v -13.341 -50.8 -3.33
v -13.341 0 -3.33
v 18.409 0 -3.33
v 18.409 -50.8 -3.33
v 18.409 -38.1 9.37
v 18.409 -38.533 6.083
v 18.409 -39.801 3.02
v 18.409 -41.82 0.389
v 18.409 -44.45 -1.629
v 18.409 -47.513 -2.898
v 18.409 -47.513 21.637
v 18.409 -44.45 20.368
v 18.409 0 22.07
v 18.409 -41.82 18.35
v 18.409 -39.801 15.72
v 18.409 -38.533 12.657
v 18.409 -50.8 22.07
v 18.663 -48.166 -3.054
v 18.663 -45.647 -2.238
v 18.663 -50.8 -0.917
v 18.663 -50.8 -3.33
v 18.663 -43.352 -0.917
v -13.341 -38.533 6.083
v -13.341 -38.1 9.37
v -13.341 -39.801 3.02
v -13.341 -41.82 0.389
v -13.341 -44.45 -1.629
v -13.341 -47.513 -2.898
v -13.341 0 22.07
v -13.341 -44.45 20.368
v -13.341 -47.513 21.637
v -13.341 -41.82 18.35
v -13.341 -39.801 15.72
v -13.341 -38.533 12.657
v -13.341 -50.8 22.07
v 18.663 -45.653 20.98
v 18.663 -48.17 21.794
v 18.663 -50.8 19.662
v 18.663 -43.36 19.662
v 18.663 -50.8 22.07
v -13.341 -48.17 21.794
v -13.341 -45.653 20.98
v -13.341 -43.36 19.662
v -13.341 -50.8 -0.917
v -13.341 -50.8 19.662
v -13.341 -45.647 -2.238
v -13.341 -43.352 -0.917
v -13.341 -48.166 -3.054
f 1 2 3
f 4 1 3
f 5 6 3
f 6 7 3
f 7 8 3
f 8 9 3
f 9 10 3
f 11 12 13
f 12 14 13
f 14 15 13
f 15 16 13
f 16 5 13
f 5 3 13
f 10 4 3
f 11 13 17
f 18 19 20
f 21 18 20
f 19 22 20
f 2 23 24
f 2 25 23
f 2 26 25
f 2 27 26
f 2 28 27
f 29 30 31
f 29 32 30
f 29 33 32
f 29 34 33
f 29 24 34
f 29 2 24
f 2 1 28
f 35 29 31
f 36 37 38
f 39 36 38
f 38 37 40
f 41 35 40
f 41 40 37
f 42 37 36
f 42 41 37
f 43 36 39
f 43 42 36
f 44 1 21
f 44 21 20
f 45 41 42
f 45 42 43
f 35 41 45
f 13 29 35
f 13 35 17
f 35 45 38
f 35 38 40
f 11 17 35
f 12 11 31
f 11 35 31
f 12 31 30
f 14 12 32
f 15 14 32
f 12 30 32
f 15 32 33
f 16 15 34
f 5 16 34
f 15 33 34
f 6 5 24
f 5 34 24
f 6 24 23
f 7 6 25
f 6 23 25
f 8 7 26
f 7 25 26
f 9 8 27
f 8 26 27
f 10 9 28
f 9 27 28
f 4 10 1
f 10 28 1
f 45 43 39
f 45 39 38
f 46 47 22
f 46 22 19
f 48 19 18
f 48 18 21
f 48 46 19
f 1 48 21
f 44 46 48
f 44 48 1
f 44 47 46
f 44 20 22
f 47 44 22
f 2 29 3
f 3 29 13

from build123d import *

# Parameters (mm, degrees)
F0_W     = 31.75
F0_H     = 25.4
F1_DEPTH = 50.8
F3_DEPTH = 25.4
F4_DEPTH = 25.4
F6_DEPTH = 32.004


with BuildPart() as f1:
    # F0 (on Front) → F1 (new body)
    with BuildSketch(Plane.XZ):
        with Locations((2.5338130072, 9.369613902)):
            Rectangle(F0_W, F0_H)
    extrude(amount=F1_DEPTH)

    # F2 (on face) → F3 (cut)
    with BuildSketch(Plane(origin=(-13.3411869928, 0, 0), x_dir=(0, -1, 0), z_dir=(-1, 0, 0))):
        with BuildLine():
            Line((38.1, 9.369613902), (50.8, 9.369613902))
            Line((50.8, 9.369613902), (50.8, 22.069613902))
            ThreePointArc((50.8, 22.069613902), (41.8197438789, 18.3498700231), (38.1, 9.369613902))
        make_face()
        with BuildLine():
            Line((50.8, -3.330386098), (50.8, 9.369613902))
            Line((50.8, 9.369613902), (38.1, 9.369613902))
            ThreePointArc((38.1, 9.369613902), (41.8197438789, 0.3893577809), (50.8, -3.330386098))
        make_face()
    extrude(amount=-F3_DEPTH, mode=Mode.SUBTRACT)

    # F4 (cut): a face of the model
    f4_faces = [f1.faces().sort_by_distance(p)[0] for p in [
        (12.0588130072, -45.409952594, 9.369613902),
    ]]
    extrude(f4_faces, amount=-F4_DEPTH, mode=Mode.SUBTRACT)


with BuildPart() as f6:
    # F5 (on face) → F6 (new body)
    with BuildSketch(Plane(origin=(-13.3411869928, 0, 0), x_dir=(0, -1, 0), z_dir=(-1, 0, 0))):
        with BuildLine():
            Line((50.8, 19.6621846408), (50.8, 22.069613902))
            ThreePointArc((50.8, 22.069613902), (46.8901181848, 21.4527767409), (43.3600411569, 19.6621846408))
            Line((43.3600411569, 19.6621846408), (50.8, 19.6621846408))
        make_face()
    extrude(amount=-F6_DEPTH)


with BuildPart() as f6b:
    # F5 (on face) → F6, piece 2 (new body)
    with BuildSketch(Plane(origin=(-13.3411869928, 0, 0), x_dir=(0, -1, 0), z_dir=(-1, 0, 0))):
        with BuildLine():
            Line((50.8, -0.917386098), (43.352340569, -0.917386098))
            ThreePointArc((43.352340569, -0.917386098), (46.8855971081, -2.7120850679), (50.8, -3.330386098))
            Line((50.8, -3.330386098), (50.8, -0.917386098))
        make_face()
    extrude(amount=-F6_DEPTH)


solid = Compound([f1.part, f6.part, f6b.part])
